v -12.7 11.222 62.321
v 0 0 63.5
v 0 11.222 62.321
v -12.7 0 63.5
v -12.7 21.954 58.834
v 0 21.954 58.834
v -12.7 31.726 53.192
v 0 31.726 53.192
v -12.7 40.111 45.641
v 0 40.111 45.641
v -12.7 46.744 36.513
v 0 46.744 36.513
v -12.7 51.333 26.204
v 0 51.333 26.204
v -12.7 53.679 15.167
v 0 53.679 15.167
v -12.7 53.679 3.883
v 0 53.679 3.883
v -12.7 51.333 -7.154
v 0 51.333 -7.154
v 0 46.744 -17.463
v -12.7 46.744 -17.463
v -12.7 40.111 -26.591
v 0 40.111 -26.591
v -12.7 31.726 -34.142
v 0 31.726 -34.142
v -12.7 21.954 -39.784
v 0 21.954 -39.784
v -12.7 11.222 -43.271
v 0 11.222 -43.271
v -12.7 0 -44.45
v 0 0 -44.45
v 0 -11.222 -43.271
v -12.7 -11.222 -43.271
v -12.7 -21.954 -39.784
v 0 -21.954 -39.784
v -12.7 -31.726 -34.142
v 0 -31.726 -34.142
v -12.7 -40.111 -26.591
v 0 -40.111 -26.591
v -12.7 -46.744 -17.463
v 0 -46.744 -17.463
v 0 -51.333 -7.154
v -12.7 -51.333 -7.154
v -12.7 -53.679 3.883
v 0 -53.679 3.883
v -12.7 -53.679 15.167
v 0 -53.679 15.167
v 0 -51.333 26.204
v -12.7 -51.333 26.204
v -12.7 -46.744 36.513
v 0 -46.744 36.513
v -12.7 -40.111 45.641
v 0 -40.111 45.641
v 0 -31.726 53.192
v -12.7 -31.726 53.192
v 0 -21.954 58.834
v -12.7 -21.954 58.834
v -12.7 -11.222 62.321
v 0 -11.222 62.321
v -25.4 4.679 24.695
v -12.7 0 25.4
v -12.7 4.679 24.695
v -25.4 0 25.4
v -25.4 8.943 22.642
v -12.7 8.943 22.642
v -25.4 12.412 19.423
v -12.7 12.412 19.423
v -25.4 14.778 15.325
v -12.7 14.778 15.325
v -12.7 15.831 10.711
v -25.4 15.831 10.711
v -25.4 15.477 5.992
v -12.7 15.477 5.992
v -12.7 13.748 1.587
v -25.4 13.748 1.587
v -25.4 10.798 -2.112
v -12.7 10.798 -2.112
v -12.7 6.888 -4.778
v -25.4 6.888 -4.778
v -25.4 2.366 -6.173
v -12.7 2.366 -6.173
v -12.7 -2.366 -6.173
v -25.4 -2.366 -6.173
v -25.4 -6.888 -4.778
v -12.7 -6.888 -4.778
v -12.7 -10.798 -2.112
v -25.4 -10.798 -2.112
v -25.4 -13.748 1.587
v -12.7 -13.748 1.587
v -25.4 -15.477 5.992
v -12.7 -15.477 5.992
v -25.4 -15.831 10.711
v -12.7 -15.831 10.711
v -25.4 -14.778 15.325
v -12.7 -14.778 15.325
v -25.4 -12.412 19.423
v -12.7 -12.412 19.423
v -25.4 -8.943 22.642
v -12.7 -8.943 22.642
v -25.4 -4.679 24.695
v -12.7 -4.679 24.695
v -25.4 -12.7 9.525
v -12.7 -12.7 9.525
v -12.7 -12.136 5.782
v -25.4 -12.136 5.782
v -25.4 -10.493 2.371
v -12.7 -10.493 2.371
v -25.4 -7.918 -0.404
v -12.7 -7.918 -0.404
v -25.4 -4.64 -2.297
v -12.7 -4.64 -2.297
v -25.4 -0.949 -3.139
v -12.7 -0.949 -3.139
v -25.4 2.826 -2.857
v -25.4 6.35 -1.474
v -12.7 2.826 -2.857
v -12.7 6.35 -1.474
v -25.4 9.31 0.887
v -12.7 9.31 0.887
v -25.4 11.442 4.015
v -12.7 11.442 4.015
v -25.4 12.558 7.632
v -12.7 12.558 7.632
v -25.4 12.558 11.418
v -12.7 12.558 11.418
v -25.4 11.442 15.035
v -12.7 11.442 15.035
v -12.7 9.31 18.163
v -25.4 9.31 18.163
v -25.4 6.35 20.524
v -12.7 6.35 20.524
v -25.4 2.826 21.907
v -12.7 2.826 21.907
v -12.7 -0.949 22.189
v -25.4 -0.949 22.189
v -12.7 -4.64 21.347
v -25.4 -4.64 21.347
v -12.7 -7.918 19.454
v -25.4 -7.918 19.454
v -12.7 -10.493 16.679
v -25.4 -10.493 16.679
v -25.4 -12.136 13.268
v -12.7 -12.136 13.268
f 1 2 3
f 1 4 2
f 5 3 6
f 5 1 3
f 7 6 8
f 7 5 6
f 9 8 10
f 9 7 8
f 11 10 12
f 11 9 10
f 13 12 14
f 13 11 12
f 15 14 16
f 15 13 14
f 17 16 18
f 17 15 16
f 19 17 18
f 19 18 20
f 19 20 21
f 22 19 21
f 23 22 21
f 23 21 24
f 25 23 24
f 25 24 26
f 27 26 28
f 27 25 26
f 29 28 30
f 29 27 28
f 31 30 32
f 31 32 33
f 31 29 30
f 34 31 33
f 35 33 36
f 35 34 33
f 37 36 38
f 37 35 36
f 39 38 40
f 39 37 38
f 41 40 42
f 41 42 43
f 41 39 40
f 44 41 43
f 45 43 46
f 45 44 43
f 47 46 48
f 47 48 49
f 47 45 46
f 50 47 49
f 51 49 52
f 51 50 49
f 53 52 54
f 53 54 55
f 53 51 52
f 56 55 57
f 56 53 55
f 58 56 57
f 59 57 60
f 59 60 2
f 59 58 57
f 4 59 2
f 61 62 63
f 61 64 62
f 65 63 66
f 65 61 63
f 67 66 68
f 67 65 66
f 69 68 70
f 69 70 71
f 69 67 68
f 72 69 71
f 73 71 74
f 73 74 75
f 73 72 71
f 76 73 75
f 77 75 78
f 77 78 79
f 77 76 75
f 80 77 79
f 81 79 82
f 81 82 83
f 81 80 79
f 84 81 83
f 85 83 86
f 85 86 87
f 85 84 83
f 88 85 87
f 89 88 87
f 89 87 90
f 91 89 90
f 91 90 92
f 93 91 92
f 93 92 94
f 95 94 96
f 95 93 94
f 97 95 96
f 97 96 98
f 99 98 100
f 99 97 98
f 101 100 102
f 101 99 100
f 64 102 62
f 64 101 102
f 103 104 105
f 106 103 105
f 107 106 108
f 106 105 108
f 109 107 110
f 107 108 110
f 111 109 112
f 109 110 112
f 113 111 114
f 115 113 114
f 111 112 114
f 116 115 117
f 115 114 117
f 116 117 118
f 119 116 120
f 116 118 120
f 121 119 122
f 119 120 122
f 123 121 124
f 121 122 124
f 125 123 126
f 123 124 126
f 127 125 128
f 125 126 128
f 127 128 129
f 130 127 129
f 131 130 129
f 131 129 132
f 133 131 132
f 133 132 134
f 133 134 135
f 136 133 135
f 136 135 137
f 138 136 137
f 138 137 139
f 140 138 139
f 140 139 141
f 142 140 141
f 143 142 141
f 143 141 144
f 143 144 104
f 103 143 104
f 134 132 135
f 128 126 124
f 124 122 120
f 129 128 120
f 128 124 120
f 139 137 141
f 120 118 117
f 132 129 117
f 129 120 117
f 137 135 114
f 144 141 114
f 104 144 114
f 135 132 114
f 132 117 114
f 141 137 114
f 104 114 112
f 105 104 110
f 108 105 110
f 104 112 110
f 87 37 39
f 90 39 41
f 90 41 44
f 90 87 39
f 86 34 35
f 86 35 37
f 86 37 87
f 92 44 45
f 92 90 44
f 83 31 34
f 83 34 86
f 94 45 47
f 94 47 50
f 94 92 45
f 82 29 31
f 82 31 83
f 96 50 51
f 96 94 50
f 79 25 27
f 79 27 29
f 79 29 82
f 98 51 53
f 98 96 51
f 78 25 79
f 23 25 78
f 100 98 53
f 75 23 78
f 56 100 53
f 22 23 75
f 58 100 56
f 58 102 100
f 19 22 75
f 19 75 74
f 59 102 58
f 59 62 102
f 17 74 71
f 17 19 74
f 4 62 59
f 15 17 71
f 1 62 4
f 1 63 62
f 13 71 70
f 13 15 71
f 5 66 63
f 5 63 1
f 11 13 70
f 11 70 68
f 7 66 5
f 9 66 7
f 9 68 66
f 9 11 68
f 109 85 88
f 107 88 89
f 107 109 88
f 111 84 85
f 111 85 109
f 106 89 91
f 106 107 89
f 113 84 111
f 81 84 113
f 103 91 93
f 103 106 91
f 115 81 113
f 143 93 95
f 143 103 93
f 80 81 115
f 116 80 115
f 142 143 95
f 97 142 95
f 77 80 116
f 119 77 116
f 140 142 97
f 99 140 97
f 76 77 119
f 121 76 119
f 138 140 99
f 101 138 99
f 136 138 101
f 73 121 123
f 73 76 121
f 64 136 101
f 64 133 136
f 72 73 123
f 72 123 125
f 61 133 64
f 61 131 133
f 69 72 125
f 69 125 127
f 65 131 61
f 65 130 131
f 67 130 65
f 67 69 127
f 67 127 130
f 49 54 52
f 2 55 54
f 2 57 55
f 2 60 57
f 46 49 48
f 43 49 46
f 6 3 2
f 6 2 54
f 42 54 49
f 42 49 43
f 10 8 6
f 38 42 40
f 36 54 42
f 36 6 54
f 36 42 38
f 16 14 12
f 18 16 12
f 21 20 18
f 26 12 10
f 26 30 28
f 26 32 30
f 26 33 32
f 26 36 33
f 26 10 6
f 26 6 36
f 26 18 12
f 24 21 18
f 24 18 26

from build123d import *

# Parameters (mm, degrees)
F3_D     = 25.4
F3_DEPTH = 12.701


with BuildPart() as f1:
    # F0 (on Front) → F1 (revolve)
    with BuildSketch(Plane.XZ):
        Polygon((-25.4, 9.525), (0, 9.525), (0, 63.5), (-12.7, 63.5), (-12.7, 25.4), (-25.4, 25.4), align=None)
    revolve(axis=Axis((-12.7, 0, 9.525), (-1, 0, 0)))

    # F3 (through all, one way)
    with BuildSketch(Plane(origin=(-12.7, 0, 0), x_dir=(0, -1, 0), z_dir=(1, 0, 0))):
        with Locations((0, -9.525)):
            Circle(F3_D / 2)
    extrude(amount=-F3_DEPTH, mode=Mode.SUBTRACT)


solid = f1.part
